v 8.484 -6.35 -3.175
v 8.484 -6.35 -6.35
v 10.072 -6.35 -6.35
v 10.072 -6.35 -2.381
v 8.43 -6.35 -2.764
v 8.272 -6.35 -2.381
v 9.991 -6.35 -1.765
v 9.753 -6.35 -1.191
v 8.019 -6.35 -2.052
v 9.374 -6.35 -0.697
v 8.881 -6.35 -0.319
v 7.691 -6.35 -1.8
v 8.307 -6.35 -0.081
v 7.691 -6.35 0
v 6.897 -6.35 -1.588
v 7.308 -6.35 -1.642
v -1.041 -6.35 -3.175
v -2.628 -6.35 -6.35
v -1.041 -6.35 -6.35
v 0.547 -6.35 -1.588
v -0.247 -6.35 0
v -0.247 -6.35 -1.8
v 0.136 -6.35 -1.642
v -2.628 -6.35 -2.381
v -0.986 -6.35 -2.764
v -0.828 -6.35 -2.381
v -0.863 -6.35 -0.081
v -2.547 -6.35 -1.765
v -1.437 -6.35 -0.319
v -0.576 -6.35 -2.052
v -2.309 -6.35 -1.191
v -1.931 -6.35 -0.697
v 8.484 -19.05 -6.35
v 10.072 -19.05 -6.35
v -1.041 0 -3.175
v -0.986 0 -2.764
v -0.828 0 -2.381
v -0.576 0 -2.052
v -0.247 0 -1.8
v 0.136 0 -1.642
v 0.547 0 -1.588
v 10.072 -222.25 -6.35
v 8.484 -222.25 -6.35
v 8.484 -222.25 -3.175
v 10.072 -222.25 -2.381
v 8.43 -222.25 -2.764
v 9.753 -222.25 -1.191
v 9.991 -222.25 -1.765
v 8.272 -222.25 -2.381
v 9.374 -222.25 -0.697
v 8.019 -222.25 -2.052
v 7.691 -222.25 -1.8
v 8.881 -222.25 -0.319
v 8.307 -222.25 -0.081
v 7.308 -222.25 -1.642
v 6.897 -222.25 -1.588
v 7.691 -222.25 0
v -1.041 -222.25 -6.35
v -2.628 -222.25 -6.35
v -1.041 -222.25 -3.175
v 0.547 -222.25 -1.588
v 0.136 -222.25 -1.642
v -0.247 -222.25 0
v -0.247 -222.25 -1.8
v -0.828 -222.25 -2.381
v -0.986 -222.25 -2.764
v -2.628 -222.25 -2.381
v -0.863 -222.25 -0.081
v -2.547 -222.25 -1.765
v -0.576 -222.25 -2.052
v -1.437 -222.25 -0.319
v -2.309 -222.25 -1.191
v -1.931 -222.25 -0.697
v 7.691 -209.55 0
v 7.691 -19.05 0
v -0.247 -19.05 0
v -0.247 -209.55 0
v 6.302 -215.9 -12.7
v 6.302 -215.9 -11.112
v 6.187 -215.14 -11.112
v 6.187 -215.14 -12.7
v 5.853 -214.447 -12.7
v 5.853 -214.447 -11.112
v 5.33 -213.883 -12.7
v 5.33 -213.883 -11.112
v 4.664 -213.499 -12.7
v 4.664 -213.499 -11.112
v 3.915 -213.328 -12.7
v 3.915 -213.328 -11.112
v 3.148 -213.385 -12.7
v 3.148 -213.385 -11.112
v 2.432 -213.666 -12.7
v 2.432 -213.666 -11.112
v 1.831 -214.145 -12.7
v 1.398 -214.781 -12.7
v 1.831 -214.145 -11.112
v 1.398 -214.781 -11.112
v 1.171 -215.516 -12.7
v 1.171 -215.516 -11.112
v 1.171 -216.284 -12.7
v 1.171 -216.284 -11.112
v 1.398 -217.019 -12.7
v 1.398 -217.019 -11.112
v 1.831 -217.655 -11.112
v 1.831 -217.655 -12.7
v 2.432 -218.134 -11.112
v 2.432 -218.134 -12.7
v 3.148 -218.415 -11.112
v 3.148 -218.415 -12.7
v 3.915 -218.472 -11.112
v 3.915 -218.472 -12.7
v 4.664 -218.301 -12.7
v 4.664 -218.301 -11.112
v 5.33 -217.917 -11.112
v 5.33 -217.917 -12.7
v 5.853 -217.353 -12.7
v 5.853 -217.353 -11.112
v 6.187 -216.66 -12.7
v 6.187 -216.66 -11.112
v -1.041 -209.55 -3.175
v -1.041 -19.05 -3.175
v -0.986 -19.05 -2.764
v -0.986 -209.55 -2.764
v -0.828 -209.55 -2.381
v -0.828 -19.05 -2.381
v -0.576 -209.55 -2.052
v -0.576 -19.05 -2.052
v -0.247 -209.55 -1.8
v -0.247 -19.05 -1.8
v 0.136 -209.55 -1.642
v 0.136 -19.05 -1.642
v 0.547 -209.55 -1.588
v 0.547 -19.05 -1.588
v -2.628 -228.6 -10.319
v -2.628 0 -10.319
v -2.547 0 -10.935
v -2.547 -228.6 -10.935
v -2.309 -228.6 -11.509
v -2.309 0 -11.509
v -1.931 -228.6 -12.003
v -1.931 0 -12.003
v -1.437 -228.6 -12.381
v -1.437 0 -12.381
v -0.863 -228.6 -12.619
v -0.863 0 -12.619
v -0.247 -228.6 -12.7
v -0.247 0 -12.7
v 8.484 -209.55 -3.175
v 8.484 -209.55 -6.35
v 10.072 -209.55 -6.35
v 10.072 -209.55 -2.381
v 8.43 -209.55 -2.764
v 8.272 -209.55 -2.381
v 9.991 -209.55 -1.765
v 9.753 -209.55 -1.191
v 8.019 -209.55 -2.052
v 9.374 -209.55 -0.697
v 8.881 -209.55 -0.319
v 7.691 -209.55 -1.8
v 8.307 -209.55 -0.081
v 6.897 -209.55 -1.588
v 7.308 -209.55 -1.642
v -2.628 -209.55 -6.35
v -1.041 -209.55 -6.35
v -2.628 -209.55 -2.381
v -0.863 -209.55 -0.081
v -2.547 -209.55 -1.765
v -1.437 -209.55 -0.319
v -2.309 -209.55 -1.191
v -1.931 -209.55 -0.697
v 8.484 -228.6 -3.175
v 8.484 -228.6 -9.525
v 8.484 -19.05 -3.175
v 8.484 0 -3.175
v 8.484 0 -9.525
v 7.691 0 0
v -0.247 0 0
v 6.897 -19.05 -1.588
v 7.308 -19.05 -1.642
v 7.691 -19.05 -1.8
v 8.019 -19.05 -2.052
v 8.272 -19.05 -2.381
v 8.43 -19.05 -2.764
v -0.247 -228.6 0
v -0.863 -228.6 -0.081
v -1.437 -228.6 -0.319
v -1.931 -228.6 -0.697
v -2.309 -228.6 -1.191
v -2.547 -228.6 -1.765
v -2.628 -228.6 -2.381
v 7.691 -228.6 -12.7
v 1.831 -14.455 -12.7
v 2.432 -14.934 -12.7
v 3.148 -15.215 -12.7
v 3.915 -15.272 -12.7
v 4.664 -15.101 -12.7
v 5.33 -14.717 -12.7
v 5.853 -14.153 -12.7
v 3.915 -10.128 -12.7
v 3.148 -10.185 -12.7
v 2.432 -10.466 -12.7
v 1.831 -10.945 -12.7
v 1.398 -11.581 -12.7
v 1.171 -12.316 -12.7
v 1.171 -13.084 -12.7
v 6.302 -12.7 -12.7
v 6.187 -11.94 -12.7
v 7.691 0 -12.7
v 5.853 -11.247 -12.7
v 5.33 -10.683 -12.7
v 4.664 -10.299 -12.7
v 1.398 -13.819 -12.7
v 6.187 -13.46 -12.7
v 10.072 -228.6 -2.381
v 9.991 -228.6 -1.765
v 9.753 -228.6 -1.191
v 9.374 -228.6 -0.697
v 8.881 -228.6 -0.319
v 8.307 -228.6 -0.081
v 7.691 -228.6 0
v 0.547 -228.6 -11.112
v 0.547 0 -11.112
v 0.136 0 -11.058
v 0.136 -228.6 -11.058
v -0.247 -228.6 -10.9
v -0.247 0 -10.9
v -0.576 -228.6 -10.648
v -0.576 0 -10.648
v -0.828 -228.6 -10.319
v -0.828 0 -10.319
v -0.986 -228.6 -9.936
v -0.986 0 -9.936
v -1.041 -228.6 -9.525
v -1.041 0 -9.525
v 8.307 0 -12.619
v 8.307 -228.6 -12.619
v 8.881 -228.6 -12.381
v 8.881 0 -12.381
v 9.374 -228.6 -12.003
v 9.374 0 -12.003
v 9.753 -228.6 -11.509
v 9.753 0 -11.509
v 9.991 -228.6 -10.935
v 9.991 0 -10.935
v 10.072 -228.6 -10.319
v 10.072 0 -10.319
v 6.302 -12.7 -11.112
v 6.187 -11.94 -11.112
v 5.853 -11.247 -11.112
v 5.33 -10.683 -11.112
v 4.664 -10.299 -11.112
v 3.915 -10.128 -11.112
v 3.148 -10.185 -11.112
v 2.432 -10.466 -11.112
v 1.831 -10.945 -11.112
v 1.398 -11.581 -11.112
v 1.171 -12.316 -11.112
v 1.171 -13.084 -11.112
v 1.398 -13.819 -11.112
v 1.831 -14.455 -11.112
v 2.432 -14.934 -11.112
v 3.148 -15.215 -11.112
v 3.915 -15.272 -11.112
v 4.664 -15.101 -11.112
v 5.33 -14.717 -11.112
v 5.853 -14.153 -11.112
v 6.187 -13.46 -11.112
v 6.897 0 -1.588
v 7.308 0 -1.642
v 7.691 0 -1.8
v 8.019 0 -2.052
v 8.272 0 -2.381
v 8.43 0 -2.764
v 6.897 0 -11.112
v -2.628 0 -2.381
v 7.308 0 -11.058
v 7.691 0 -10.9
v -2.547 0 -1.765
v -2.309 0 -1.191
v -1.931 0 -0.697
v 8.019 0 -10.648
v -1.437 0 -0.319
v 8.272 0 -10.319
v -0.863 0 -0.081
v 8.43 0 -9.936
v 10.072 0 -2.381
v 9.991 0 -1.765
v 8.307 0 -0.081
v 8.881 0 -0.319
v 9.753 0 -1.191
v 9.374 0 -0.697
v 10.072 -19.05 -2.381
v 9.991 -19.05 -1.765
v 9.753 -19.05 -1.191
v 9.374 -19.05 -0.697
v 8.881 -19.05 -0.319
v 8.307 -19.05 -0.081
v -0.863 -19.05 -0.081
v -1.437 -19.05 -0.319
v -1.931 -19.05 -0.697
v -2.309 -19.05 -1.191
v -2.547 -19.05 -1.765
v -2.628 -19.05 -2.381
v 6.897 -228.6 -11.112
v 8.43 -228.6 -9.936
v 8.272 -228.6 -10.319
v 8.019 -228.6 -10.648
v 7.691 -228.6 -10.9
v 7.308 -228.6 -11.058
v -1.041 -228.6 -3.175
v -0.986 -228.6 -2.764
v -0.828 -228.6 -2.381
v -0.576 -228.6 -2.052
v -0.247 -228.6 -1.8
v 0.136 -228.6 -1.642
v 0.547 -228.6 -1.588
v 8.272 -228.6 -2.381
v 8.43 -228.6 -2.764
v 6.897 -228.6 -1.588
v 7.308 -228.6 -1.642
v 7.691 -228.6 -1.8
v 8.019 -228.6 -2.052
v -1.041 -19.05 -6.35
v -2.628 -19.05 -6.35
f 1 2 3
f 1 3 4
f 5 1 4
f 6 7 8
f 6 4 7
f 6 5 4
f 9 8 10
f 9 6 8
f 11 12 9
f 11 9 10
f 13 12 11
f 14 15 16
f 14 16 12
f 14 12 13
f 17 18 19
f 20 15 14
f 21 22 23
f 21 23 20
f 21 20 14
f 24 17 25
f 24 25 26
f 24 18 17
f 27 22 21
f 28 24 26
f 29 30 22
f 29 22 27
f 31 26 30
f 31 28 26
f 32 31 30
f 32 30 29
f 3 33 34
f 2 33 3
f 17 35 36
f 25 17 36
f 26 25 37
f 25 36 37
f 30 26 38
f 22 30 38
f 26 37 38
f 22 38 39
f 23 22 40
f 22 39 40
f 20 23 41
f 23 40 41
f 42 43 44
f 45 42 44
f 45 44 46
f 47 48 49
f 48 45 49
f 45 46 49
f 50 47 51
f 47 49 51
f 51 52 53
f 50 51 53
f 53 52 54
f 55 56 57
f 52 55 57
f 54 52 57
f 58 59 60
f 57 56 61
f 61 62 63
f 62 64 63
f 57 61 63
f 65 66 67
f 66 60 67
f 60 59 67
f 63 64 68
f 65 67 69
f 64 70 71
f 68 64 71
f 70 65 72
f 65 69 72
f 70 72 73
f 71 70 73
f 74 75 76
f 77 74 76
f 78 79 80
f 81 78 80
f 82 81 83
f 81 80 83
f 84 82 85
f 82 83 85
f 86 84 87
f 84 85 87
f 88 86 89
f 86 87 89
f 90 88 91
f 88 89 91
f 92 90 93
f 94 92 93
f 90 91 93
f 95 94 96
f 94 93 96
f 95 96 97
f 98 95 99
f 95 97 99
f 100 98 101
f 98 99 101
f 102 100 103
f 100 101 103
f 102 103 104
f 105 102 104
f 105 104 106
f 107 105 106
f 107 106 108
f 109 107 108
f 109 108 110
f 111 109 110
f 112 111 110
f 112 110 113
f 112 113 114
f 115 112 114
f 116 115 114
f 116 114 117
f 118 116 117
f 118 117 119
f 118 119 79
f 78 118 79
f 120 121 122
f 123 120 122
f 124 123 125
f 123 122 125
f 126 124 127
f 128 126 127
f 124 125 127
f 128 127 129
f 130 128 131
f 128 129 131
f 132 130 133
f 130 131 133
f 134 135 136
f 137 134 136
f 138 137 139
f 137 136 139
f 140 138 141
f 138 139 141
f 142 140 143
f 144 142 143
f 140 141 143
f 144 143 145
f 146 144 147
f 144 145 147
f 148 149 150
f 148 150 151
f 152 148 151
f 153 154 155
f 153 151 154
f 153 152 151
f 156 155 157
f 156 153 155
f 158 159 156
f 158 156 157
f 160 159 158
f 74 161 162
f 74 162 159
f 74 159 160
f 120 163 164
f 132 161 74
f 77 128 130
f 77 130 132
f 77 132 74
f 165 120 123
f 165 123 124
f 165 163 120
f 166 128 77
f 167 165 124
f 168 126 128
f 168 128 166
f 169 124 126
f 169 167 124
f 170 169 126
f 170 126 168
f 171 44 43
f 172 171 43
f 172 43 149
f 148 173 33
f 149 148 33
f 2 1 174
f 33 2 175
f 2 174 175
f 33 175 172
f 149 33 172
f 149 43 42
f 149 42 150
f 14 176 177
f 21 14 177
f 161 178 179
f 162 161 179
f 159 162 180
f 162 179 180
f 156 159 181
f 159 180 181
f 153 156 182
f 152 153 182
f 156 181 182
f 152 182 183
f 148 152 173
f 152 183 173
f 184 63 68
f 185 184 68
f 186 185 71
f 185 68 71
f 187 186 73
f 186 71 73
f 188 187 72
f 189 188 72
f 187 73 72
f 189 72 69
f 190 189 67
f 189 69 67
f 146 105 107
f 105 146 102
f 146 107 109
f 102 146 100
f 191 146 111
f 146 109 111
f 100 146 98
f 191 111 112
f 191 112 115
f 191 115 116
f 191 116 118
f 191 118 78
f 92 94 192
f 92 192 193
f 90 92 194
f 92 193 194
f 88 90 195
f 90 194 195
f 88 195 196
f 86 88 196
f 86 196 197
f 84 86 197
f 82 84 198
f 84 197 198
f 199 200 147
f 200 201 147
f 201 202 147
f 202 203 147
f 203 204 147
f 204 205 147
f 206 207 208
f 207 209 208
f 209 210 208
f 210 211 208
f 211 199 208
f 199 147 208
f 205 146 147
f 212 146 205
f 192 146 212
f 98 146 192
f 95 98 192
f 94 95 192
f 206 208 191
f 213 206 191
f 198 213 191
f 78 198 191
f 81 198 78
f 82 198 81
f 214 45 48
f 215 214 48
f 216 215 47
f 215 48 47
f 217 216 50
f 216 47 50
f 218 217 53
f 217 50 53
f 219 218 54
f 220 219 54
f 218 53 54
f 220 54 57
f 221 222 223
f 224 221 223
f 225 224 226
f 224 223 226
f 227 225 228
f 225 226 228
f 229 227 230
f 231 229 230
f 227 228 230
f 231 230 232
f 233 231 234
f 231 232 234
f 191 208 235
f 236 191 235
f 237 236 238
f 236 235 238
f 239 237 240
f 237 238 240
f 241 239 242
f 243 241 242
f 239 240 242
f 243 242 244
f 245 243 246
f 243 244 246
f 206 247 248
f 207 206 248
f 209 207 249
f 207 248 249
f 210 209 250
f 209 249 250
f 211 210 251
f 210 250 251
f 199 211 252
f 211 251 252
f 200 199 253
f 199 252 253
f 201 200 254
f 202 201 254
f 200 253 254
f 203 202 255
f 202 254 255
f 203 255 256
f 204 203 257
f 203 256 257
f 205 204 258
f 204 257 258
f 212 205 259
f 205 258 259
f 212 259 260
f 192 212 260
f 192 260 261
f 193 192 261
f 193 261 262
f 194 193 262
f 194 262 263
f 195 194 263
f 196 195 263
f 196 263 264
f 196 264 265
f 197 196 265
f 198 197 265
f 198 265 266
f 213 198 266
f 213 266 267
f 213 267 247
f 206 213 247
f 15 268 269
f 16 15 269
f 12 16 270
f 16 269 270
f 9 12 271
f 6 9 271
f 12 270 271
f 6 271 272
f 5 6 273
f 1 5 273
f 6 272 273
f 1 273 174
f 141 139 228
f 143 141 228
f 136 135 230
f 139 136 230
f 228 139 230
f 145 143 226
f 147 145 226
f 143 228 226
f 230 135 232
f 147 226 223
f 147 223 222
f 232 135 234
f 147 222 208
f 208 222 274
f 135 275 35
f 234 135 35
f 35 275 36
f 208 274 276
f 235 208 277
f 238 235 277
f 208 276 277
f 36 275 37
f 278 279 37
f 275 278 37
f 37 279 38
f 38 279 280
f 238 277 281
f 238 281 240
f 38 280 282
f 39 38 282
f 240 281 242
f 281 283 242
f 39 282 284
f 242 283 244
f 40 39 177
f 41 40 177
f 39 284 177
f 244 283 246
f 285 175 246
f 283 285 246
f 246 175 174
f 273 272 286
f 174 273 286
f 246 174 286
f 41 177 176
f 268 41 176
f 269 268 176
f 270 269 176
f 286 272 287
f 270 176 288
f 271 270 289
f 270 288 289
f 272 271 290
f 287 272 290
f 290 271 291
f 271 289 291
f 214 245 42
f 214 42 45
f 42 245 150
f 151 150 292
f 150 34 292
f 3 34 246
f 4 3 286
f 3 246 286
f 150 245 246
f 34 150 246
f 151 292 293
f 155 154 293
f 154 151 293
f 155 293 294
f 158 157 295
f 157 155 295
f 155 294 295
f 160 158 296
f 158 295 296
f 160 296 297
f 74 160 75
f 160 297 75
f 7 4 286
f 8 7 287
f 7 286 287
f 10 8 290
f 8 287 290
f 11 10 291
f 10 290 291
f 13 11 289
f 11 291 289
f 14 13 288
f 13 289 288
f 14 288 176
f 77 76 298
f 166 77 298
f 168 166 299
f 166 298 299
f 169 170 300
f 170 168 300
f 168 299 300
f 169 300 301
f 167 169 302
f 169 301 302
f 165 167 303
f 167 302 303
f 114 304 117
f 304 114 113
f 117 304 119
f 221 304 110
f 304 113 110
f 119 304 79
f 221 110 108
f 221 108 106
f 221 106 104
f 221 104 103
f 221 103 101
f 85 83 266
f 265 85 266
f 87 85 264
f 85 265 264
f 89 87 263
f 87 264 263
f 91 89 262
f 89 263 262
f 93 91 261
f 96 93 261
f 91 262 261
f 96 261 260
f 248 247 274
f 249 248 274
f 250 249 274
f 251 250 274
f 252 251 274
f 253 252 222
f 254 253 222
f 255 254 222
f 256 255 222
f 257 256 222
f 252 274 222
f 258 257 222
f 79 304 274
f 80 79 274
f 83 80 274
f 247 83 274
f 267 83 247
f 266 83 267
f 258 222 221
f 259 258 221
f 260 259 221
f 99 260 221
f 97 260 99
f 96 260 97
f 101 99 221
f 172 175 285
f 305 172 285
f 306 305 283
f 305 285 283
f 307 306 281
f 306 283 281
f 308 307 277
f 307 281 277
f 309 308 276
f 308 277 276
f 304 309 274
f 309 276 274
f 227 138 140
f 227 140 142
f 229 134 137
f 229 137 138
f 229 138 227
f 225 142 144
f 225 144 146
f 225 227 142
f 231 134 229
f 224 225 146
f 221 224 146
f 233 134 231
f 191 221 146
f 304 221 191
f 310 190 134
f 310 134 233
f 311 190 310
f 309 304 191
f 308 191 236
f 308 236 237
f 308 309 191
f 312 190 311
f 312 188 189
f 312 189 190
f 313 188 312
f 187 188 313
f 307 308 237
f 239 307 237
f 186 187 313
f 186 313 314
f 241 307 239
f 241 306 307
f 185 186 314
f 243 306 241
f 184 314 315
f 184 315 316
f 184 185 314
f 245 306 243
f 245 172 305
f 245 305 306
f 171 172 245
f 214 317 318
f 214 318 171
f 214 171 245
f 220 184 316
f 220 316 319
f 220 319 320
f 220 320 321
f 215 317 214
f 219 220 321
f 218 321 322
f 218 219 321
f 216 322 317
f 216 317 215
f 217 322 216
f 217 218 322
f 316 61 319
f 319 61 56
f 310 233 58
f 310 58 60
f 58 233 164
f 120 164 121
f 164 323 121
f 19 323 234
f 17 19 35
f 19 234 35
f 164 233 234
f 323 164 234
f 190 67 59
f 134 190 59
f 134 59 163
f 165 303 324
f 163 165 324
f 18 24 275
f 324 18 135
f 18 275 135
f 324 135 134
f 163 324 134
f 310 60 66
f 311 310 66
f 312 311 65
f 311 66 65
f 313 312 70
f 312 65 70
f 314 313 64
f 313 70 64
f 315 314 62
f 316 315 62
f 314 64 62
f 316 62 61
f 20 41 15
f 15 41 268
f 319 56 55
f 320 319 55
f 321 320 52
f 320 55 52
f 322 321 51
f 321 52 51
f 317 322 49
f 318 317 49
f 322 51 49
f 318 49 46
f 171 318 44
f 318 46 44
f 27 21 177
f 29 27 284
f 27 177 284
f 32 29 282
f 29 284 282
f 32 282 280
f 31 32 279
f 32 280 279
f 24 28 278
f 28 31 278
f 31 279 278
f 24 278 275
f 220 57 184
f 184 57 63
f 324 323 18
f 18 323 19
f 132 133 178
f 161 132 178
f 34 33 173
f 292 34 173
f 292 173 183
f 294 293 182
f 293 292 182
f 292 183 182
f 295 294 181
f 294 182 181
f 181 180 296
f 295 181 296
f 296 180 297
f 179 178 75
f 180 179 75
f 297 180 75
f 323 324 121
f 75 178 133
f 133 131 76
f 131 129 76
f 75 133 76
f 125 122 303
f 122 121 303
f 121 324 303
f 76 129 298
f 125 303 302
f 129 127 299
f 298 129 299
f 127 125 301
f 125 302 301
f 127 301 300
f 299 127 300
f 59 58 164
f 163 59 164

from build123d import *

# Parameters (mm, degrees)
F1_DEPTH      = 228.6
F2_W          = 12.7
F2_H          = 6.35
F3_DEPTH      = 11.938
F3_DEPTH_BACK = 25.4
F4_R          = 2.579688
F5_DEPTH      = 12.7


with BuildPart() as f1:
    # F0 (on Front) → F1 (new body)
    with BuildSketch(Plane.XZ):
        with BuildLine():
            ThreePointArc((10.071912, -2.38125), (9.37446, -0.697452), (7.690662, 0))
            Line((7.690662, 0), (-0.246838, 0))
            ThreePointArc((-0.246838, 0), (-1.930636, -0.697452), (-2.628088, -2.38125))
            Line((-2.628088, -2.38125), (-2.628088, -10.31875))
            ThreePointArc((-2.628088, -10.31875), (-1.930636, -12.002548), (-0.246838, -12.7))
            Line((-0.246838, -12.7), (7.690662, -12.7))
            ThreePointArc((7.690662, -12.7), (9.37446, -12.002548), (10.071912, -10.31875))
            Line((10.071912, -10.31875), (10.071912, -2.38125))
        make_face()
        with BuildLine():
            Line((0.546912, -1.5875), (6.896912, -1.5875))
            ThreePointArc((6.896912, -1.5875), (8.019444, -2.052468), (8.484412, -3.175))
            Line((8.484412, -3.175), (8.484412, -9.525))
            ThreePointArc((8.484412, -9.525), (8.019444, -10.647532), (6.896912, -11.1125))
            Line((6.896912, -11.1125), (0.546912, -11.1125))
            ThreePointArc((0.546912, -11.1125), (-0.57562, -10.647532), (-1.040588, -9.525))
            Line((-1.040588, -9.525), (-1.040588, -3.175))
            ThreePointArc((-1.040588, -3.175), (-0.57562, -2.052468), (0.546912, -1.5875))
        make_face(mode=Mode.SUBTRACT)
    extrude(amount=F1_DEPTH)

    # F2 (on Right) → F3 (cut, two sides)
    with BuildSketch(Plane.YZ) as f3_sk:
        with Locations((-215.9, -3.175)):
            Rectangle(F2_W, F2_H)
        with Locations((-12.7, -3.175)):
            Rectangle(F2_W, F2_H)
    extrude(amount=F3_DEPTH, mode=Mode.SUBTRACT)
    extrude(f3_sk.sketch, amount=-F3_DEPTH_BACK, mode=Mode.SUBTRACT)

    # F4 (on Top) → F5 (cut)
    with BuildSketch(Plane.XY):
        with Locations((3.721912, -12.7)):
            Circle(F4_R)
        with Locations((3.721912, -215.9)):
            Circle(F4_R)
    extrude(amount=-F5_DEPTH, mode=Mode.SUBTRACT)


solid = f1.part
